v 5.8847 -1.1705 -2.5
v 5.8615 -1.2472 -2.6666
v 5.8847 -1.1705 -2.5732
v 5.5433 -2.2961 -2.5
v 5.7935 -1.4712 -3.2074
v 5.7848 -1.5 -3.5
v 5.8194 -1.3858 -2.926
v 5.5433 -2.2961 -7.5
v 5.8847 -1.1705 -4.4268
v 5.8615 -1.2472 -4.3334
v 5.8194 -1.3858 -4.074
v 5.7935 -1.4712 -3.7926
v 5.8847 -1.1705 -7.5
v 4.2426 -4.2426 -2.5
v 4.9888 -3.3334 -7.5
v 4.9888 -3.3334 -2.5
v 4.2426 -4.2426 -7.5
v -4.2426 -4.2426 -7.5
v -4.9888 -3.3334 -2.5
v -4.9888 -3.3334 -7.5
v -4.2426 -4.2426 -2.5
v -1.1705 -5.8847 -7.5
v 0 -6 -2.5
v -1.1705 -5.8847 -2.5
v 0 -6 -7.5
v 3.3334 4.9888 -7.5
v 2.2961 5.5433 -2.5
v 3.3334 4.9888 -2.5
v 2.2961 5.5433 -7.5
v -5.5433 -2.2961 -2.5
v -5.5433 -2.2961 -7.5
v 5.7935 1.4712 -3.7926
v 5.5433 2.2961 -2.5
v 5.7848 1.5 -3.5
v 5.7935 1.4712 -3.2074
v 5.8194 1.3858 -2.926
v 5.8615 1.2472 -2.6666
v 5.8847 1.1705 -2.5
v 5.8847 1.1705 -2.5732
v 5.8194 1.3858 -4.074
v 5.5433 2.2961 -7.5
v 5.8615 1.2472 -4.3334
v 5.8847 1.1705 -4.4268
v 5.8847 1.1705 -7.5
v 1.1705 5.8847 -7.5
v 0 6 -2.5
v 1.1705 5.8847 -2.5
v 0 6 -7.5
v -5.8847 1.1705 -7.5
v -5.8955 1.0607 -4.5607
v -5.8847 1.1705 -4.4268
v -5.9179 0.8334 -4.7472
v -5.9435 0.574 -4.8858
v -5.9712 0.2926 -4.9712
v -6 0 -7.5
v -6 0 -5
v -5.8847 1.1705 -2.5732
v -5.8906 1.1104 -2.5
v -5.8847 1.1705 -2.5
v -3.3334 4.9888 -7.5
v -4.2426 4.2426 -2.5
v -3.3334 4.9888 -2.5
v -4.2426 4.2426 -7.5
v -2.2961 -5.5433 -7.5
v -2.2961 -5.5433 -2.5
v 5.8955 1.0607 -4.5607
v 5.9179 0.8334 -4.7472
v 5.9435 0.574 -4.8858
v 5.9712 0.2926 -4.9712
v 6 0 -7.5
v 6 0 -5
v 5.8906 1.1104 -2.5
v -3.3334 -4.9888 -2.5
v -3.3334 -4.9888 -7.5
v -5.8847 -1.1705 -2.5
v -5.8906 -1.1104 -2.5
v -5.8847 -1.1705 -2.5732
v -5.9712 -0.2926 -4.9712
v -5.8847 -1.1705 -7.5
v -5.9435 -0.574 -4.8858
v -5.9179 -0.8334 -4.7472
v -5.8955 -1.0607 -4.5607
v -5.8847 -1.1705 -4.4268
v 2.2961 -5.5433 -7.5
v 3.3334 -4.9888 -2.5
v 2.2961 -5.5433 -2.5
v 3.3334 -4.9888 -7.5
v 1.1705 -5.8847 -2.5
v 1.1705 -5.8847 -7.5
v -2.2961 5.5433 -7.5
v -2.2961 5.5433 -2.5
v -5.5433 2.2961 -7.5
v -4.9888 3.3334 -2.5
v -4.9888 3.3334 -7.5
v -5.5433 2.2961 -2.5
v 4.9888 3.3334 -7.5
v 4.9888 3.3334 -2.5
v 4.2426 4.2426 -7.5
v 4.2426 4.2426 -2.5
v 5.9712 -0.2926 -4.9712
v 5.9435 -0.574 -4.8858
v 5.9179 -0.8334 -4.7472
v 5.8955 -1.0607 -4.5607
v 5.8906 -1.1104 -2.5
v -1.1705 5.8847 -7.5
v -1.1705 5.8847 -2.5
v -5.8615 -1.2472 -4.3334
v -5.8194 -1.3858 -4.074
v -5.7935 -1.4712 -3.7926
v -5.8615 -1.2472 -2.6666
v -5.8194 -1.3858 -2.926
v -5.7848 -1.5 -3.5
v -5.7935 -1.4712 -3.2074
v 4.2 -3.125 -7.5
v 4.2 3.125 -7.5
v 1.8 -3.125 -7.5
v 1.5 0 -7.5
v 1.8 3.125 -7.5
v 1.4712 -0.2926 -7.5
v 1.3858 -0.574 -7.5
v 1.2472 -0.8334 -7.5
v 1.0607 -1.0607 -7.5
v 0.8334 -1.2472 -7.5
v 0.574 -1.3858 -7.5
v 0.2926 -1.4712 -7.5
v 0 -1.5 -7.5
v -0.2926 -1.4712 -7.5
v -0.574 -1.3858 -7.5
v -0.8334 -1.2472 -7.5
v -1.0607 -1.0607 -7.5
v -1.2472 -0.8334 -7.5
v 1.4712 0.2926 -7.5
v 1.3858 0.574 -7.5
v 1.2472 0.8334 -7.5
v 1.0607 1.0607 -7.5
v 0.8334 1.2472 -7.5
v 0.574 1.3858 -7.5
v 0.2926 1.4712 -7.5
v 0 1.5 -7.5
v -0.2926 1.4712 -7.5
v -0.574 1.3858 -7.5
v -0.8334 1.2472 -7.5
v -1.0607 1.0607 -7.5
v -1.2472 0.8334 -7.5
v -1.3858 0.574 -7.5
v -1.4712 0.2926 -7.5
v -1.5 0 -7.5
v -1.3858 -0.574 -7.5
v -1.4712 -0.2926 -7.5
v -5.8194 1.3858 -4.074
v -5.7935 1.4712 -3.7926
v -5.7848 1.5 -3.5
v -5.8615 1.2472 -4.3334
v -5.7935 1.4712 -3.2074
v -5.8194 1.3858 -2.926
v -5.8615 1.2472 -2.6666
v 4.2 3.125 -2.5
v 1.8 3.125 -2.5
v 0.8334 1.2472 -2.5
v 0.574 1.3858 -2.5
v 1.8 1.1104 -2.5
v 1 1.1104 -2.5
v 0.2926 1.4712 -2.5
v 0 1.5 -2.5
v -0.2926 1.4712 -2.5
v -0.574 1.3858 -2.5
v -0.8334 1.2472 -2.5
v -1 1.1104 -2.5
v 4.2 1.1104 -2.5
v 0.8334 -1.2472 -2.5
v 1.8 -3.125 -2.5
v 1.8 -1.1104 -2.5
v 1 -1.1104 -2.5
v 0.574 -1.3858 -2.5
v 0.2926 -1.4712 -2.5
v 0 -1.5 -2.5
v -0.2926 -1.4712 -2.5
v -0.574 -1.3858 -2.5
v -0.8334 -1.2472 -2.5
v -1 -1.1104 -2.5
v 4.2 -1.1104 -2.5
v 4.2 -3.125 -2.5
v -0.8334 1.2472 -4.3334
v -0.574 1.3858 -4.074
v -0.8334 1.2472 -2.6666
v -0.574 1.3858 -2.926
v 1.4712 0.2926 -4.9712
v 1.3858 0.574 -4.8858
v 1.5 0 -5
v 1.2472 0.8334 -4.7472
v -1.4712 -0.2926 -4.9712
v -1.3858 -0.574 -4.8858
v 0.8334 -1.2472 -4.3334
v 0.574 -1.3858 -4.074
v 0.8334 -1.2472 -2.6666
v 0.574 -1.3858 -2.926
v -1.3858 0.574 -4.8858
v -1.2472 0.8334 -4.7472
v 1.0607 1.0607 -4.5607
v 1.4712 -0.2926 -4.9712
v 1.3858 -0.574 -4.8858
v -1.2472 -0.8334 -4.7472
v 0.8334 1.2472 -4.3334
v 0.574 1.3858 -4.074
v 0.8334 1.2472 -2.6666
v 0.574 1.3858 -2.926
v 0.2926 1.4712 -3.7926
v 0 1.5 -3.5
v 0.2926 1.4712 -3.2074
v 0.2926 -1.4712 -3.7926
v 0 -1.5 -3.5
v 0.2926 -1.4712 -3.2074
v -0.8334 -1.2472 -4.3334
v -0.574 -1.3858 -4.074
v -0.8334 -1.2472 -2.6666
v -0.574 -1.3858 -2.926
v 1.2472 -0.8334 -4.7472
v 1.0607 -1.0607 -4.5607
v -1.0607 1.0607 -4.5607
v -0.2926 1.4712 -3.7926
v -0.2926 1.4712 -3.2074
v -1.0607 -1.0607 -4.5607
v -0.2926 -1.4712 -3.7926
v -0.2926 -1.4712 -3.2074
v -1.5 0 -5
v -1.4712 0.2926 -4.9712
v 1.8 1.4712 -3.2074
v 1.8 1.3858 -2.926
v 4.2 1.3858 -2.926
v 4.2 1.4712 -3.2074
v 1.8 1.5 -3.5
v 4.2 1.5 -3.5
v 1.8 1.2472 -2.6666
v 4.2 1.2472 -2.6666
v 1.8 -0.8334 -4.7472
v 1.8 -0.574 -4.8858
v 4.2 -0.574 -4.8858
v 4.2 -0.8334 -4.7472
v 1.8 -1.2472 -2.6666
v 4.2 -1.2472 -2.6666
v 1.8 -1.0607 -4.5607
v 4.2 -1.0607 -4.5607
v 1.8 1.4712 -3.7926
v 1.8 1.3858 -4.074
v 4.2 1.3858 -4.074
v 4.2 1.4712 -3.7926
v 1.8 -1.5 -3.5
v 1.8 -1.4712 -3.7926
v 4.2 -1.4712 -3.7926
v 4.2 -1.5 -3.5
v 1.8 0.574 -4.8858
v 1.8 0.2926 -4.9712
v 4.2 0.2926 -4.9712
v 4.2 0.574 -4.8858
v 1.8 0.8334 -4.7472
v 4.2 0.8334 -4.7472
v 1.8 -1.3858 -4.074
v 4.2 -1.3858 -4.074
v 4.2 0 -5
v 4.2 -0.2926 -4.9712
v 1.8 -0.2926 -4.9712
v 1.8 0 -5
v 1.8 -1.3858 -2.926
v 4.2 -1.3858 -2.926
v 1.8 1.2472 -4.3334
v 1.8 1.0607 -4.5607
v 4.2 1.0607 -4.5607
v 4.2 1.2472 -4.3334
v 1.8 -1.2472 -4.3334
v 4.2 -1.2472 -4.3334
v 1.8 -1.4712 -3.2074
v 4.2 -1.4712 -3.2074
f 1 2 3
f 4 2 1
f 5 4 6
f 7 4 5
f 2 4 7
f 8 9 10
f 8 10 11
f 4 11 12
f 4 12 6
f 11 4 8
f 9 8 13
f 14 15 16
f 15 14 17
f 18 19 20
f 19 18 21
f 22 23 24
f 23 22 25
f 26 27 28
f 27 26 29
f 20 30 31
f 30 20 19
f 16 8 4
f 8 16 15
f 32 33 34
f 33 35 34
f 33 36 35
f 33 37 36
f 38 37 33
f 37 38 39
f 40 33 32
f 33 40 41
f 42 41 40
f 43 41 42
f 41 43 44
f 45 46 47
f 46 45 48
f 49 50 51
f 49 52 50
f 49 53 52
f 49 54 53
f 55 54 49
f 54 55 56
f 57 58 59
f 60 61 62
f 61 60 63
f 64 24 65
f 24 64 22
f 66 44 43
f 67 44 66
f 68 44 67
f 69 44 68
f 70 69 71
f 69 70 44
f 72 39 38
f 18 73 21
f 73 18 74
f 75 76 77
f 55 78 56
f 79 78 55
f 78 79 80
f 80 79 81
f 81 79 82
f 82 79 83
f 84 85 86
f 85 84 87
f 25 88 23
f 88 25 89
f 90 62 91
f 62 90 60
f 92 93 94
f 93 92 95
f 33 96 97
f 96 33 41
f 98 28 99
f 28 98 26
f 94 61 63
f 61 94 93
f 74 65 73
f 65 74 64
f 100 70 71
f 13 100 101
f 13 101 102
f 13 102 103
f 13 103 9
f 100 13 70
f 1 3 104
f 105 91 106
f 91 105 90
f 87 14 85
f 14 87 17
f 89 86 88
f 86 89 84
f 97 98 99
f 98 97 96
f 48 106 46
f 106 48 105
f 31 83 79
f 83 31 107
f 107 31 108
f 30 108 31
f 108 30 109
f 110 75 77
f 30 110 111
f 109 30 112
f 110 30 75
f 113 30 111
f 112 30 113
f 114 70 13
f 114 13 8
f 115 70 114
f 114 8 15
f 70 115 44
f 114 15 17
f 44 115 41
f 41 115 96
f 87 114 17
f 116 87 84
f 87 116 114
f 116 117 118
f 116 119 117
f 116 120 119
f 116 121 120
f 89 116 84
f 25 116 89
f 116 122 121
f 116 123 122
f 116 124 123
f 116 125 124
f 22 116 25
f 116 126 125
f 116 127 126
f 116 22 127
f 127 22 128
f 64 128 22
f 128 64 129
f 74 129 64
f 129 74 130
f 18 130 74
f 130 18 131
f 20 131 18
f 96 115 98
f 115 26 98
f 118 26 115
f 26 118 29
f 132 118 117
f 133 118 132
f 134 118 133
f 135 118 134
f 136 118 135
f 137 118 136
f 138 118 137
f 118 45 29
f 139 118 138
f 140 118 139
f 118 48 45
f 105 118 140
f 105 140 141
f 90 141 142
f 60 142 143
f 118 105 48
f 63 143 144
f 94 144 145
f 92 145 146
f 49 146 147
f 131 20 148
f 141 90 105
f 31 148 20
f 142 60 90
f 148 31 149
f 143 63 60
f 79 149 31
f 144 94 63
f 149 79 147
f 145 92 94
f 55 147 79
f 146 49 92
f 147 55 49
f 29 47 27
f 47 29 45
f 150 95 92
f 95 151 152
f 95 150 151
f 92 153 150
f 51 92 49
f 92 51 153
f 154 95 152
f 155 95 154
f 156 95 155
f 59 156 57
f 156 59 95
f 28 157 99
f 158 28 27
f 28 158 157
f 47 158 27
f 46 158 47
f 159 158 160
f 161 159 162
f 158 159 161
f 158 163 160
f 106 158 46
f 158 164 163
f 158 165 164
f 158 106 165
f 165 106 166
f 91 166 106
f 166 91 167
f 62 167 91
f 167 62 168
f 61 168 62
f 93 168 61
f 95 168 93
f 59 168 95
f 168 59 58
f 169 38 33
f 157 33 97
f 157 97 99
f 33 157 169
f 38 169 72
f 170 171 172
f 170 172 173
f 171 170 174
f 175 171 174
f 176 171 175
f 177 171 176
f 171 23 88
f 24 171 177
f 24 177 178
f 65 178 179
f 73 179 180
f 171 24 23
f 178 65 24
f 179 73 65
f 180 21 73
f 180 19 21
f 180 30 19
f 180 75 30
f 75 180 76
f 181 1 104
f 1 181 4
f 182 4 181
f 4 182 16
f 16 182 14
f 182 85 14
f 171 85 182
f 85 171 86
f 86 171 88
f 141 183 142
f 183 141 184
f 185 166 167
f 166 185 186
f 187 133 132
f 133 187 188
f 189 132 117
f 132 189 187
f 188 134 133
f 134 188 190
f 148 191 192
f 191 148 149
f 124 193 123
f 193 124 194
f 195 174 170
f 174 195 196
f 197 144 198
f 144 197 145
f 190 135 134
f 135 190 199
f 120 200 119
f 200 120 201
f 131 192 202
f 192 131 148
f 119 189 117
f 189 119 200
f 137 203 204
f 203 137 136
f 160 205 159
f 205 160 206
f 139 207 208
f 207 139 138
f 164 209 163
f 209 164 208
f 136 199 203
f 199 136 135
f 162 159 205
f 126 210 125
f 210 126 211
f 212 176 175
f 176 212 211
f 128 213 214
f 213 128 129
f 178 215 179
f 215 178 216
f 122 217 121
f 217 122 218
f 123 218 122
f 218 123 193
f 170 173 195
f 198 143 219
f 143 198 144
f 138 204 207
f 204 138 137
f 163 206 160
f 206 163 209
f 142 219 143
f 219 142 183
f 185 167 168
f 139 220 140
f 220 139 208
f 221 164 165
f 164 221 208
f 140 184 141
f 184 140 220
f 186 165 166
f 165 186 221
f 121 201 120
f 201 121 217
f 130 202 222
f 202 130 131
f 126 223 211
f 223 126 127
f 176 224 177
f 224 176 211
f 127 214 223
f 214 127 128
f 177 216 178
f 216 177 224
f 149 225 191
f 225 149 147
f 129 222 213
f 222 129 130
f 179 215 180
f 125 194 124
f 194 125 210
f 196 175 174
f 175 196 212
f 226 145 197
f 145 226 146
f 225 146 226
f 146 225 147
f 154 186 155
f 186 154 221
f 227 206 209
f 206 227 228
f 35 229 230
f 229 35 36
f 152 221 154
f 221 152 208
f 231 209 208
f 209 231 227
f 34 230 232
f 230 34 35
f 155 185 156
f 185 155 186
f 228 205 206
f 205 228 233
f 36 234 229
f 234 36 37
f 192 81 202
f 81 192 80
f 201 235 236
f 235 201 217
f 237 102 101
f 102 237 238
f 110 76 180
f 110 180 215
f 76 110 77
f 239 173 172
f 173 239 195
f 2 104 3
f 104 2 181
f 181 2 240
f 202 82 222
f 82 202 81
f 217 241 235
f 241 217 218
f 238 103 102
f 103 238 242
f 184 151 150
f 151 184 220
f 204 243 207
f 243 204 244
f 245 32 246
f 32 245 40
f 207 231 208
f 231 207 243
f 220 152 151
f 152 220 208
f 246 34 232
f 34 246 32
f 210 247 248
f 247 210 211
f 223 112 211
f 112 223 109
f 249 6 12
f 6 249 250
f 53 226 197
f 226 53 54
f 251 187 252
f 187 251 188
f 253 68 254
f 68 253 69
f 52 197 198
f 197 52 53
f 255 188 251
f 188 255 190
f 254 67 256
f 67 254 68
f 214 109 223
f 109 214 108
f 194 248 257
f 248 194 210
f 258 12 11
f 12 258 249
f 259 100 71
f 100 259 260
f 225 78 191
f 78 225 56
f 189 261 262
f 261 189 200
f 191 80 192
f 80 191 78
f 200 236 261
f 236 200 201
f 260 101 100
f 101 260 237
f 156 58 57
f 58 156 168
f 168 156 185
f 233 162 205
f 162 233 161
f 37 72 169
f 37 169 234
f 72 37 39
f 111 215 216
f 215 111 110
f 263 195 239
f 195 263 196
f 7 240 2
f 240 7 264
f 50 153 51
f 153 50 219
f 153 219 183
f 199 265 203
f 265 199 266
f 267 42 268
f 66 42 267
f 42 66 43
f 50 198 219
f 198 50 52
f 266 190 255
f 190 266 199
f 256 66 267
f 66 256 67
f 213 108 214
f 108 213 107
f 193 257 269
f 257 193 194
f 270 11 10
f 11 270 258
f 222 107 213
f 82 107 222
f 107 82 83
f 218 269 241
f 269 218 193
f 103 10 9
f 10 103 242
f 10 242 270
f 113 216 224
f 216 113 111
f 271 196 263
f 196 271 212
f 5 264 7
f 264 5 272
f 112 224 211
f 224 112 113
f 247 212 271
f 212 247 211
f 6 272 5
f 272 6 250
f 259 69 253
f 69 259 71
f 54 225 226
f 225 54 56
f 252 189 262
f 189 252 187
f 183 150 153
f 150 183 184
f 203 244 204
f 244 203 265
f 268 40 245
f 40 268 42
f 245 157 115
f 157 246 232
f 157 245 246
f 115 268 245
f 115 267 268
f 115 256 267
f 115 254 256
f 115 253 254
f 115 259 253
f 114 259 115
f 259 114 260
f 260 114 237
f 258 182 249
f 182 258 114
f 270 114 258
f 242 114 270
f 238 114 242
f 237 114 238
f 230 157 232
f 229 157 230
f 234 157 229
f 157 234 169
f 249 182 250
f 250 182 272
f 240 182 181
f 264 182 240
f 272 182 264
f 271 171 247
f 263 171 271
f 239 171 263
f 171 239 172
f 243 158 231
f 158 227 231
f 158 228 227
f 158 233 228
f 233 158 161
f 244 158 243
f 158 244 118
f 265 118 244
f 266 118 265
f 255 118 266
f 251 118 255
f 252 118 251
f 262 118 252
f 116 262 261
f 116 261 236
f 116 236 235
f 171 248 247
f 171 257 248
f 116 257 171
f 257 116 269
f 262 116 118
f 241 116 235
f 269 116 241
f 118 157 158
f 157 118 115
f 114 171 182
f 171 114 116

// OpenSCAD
//!OpenSCAD

DRAFT = 1; // switch off for potentially higher quality final render
smooth = DRAFT == 1 ? 32 : 128;
nozzle_d = 0.4;
$fn = smooth;
pad = 0.01;

// Cookie cutter dimensions
base_h = 3;
feature_h = 2;
cut_base_h = 3;
plunger_h = 5;
page_offset = 3;
heart_w = 81.5 + page_offset;
heart_l = 68.9 + page_offset;

difference(){
union(){
    difference(){
        union()
        {
            hull()
            {
            linear_extrude(height=1)
            scale(0.25)
            translate([-heart_w/2 - page_offset/2, -heart_l/2 - page_offset/2])
            scale(0.1)
            import(file="BaymaxHeartFace.dxf", layer="Heart", center=true);

            translate([0,0,-plunger_h])
            cylinder(h=plunger_h, r=6, center=true);
            }

        linear_extrude(height=base_h)
            scale(0.25)
            translate([-heart_w/2 - page_offset/2, -heart_l/2 - page_offset/2])
            scale(0.1)
            import(file="BaymaxHeartFace.dxf", layer="Heart", center=true);
        }

    translate([0,0,base_h - feature_h + pad])
    linear_extrude(height=feature_h)
    scale(0.25)
    translate([-heart_w/2 - page_offset/2, -heart_l/2 - page_offset/2])
    scale(0.1)
    import(file="BaymaxHeartFace.dxf", layer="Face", center=true);
    }

translate([0,0,base_h - feature_h])
linear_extrude(height=feature_h/2)
scale(0.25)
translate([-heart_w/2 - page_offset/2, -heart_l/2 - page_offset/2])
scale(0.1)
import(file="BaymaxHeartFace.dxf", layer="Eyes", center=true);
}

#translate([0,0,-plunger_h])
cylinder(h=10, r=1.5, center=true);

#translate([0,0,-3.5])
rotate([90,0,90])
cylinder(h=12, r=1.5, center=true);

#translate([3,0,-4])
cube([2.4, 6.25, 10], center=true);
}
